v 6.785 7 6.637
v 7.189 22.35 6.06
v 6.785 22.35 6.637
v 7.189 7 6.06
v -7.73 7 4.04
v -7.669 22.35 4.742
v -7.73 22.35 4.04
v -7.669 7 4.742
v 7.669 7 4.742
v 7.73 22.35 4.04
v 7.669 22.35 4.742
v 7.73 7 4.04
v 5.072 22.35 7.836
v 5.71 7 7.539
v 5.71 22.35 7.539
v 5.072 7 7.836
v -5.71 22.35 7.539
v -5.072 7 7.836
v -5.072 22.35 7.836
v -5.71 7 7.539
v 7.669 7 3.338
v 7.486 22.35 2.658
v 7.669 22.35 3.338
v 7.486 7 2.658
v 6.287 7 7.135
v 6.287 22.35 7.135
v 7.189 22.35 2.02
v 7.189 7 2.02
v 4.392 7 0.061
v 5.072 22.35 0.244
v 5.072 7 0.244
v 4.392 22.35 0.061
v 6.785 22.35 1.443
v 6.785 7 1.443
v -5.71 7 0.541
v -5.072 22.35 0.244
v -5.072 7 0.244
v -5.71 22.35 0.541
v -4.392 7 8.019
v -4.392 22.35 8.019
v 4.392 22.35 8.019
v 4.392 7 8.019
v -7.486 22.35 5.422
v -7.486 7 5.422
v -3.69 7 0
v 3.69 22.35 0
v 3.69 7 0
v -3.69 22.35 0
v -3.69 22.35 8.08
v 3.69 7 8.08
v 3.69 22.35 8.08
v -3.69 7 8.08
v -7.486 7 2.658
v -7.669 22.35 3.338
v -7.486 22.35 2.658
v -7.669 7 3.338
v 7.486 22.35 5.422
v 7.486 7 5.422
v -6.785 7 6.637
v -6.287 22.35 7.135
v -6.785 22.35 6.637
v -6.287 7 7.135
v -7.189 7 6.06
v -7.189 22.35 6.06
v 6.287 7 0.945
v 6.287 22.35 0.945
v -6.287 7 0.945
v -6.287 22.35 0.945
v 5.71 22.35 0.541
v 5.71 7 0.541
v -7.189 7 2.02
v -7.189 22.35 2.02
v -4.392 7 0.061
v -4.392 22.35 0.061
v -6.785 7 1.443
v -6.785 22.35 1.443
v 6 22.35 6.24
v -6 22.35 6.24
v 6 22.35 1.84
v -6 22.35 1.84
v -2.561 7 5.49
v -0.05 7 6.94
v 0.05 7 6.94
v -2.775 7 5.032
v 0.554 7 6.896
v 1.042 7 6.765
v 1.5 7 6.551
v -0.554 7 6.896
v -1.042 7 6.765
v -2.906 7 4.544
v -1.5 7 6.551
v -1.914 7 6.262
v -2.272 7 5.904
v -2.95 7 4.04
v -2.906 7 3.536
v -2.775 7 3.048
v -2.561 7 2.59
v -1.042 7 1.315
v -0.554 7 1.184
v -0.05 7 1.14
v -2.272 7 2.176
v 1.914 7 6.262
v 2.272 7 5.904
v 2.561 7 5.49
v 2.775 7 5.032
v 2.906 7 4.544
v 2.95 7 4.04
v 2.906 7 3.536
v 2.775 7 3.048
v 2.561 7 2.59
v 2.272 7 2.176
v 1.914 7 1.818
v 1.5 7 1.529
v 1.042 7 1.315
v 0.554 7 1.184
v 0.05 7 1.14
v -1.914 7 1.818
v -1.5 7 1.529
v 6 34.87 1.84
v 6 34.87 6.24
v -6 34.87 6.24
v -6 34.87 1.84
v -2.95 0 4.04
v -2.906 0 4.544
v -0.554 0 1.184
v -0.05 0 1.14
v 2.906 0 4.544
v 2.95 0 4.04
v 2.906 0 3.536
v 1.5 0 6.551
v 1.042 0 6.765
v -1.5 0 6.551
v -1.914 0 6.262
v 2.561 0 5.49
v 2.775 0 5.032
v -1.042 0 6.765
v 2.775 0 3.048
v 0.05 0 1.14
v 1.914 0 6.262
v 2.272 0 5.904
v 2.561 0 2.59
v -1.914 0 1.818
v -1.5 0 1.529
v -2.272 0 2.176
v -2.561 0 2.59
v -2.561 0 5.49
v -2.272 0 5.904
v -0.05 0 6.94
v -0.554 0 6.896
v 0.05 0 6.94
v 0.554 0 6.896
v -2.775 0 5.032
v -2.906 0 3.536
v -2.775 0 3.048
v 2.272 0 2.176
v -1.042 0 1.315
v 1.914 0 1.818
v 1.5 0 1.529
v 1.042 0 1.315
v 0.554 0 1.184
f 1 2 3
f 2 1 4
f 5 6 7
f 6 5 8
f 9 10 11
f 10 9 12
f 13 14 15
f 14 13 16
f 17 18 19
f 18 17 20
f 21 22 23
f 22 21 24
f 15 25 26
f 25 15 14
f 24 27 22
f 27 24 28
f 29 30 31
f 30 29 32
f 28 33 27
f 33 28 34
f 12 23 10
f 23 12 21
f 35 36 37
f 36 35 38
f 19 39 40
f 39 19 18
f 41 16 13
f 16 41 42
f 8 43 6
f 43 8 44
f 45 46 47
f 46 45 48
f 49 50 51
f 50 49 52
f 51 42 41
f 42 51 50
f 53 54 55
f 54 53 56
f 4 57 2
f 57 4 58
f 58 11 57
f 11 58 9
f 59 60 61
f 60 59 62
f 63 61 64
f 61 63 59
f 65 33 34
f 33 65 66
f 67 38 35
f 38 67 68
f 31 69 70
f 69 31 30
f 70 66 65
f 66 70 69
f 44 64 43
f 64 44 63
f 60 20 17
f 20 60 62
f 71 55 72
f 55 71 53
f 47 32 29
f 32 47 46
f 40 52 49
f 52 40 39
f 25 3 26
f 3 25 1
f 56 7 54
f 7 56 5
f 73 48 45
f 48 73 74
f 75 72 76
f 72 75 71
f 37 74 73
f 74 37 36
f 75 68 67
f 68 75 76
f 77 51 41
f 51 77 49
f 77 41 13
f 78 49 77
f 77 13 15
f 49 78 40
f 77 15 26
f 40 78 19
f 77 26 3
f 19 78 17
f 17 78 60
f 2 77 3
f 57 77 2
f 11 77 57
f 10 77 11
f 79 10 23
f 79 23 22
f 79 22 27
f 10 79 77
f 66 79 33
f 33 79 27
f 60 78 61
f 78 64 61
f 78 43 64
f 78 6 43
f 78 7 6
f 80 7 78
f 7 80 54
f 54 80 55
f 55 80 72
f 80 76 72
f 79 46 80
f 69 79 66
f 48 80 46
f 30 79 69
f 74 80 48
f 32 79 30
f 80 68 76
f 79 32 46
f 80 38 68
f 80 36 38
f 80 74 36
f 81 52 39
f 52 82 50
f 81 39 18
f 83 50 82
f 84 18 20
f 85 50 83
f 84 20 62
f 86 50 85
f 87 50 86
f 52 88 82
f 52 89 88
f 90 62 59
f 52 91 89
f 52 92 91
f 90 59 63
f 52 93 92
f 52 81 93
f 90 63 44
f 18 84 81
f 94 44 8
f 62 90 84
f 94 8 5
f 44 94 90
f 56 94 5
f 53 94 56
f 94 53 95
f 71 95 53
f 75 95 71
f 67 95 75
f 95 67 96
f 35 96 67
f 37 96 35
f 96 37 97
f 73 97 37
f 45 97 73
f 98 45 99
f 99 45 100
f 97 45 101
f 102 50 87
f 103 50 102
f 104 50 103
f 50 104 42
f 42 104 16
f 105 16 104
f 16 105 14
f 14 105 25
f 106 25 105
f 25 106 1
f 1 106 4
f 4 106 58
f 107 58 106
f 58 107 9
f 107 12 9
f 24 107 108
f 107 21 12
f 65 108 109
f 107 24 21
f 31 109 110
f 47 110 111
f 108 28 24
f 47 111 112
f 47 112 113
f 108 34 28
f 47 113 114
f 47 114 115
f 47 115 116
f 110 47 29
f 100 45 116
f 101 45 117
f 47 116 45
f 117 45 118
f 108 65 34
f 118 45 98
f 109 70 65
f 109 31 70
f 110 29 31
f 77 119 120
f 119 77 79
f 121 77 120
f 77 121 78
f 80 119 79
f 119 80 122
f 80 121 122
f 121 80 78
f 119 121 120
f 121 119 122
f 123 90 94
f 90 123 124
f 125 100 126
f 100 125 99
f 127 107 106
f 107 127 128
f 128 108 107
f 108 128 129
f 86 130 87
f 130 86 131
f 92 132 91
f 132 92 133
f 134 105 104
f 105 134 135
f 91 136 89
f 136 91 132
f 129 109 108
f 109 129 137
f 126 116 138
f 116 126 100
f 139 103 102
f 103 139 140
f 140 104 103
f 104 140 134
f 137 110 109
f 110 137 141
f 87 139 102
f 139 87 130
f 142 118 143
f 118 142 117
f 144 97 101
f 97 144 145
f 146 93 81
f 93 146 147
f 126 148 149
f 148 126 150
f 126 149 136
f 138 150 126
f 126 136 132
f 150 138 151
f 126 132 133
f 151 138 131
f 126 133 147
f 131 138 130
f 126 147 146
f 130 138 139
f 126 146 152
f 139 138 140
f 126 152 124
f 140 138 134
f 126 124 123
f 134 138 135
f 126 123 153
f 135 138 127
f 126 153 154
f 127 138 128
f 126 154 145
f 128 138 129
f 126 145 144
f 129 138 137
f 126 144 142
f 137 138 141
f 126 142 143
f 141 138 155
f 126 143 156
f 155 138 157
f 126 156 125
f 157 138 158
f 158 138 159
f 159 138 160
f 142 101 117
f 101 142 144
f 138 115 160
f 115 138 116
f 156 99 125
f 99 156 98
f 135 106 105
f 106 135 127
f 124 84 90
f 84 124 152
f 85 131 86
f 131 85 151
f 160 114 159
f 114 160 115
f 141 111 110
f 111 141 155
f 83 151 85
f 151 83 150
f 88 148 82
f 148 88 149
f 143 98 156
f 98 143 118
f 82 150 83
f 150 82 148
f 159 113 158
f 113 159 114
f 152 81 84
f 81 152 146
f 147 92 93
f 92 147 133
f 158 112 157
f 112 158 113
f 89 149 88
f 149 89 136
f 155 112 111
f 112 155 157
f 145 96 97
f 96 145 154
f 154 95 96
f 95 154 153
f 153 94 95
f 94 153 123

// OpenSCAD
/**
  * Module: USB A Placeholder placeholder
  *
  * Author: Karim Aziiev <karim.aziiev@gmail.com>
  * License: GPL-3.0-or-later
  */

include <../../parameters.scad>

use <generic_usb_plug.scad>

function usb_a_oriented_size(plist=usb_a_plist, orientation="wlh") =
  usb_oriented_size(plist,
                    orientation=orientation);

function usb_a_params(plist=usb_a_plist, orientation="wlh") =
  usb_params(plist);

module usb_a_plug(plist=usb_a_plist,
                  orientation="wlh",
                  anchor=[0, 1, 1]) {
  generic_usb_plug(plist=plist,
                   orientation=orientation,
                   anchor=anchor);
}

usb_a_plug();
